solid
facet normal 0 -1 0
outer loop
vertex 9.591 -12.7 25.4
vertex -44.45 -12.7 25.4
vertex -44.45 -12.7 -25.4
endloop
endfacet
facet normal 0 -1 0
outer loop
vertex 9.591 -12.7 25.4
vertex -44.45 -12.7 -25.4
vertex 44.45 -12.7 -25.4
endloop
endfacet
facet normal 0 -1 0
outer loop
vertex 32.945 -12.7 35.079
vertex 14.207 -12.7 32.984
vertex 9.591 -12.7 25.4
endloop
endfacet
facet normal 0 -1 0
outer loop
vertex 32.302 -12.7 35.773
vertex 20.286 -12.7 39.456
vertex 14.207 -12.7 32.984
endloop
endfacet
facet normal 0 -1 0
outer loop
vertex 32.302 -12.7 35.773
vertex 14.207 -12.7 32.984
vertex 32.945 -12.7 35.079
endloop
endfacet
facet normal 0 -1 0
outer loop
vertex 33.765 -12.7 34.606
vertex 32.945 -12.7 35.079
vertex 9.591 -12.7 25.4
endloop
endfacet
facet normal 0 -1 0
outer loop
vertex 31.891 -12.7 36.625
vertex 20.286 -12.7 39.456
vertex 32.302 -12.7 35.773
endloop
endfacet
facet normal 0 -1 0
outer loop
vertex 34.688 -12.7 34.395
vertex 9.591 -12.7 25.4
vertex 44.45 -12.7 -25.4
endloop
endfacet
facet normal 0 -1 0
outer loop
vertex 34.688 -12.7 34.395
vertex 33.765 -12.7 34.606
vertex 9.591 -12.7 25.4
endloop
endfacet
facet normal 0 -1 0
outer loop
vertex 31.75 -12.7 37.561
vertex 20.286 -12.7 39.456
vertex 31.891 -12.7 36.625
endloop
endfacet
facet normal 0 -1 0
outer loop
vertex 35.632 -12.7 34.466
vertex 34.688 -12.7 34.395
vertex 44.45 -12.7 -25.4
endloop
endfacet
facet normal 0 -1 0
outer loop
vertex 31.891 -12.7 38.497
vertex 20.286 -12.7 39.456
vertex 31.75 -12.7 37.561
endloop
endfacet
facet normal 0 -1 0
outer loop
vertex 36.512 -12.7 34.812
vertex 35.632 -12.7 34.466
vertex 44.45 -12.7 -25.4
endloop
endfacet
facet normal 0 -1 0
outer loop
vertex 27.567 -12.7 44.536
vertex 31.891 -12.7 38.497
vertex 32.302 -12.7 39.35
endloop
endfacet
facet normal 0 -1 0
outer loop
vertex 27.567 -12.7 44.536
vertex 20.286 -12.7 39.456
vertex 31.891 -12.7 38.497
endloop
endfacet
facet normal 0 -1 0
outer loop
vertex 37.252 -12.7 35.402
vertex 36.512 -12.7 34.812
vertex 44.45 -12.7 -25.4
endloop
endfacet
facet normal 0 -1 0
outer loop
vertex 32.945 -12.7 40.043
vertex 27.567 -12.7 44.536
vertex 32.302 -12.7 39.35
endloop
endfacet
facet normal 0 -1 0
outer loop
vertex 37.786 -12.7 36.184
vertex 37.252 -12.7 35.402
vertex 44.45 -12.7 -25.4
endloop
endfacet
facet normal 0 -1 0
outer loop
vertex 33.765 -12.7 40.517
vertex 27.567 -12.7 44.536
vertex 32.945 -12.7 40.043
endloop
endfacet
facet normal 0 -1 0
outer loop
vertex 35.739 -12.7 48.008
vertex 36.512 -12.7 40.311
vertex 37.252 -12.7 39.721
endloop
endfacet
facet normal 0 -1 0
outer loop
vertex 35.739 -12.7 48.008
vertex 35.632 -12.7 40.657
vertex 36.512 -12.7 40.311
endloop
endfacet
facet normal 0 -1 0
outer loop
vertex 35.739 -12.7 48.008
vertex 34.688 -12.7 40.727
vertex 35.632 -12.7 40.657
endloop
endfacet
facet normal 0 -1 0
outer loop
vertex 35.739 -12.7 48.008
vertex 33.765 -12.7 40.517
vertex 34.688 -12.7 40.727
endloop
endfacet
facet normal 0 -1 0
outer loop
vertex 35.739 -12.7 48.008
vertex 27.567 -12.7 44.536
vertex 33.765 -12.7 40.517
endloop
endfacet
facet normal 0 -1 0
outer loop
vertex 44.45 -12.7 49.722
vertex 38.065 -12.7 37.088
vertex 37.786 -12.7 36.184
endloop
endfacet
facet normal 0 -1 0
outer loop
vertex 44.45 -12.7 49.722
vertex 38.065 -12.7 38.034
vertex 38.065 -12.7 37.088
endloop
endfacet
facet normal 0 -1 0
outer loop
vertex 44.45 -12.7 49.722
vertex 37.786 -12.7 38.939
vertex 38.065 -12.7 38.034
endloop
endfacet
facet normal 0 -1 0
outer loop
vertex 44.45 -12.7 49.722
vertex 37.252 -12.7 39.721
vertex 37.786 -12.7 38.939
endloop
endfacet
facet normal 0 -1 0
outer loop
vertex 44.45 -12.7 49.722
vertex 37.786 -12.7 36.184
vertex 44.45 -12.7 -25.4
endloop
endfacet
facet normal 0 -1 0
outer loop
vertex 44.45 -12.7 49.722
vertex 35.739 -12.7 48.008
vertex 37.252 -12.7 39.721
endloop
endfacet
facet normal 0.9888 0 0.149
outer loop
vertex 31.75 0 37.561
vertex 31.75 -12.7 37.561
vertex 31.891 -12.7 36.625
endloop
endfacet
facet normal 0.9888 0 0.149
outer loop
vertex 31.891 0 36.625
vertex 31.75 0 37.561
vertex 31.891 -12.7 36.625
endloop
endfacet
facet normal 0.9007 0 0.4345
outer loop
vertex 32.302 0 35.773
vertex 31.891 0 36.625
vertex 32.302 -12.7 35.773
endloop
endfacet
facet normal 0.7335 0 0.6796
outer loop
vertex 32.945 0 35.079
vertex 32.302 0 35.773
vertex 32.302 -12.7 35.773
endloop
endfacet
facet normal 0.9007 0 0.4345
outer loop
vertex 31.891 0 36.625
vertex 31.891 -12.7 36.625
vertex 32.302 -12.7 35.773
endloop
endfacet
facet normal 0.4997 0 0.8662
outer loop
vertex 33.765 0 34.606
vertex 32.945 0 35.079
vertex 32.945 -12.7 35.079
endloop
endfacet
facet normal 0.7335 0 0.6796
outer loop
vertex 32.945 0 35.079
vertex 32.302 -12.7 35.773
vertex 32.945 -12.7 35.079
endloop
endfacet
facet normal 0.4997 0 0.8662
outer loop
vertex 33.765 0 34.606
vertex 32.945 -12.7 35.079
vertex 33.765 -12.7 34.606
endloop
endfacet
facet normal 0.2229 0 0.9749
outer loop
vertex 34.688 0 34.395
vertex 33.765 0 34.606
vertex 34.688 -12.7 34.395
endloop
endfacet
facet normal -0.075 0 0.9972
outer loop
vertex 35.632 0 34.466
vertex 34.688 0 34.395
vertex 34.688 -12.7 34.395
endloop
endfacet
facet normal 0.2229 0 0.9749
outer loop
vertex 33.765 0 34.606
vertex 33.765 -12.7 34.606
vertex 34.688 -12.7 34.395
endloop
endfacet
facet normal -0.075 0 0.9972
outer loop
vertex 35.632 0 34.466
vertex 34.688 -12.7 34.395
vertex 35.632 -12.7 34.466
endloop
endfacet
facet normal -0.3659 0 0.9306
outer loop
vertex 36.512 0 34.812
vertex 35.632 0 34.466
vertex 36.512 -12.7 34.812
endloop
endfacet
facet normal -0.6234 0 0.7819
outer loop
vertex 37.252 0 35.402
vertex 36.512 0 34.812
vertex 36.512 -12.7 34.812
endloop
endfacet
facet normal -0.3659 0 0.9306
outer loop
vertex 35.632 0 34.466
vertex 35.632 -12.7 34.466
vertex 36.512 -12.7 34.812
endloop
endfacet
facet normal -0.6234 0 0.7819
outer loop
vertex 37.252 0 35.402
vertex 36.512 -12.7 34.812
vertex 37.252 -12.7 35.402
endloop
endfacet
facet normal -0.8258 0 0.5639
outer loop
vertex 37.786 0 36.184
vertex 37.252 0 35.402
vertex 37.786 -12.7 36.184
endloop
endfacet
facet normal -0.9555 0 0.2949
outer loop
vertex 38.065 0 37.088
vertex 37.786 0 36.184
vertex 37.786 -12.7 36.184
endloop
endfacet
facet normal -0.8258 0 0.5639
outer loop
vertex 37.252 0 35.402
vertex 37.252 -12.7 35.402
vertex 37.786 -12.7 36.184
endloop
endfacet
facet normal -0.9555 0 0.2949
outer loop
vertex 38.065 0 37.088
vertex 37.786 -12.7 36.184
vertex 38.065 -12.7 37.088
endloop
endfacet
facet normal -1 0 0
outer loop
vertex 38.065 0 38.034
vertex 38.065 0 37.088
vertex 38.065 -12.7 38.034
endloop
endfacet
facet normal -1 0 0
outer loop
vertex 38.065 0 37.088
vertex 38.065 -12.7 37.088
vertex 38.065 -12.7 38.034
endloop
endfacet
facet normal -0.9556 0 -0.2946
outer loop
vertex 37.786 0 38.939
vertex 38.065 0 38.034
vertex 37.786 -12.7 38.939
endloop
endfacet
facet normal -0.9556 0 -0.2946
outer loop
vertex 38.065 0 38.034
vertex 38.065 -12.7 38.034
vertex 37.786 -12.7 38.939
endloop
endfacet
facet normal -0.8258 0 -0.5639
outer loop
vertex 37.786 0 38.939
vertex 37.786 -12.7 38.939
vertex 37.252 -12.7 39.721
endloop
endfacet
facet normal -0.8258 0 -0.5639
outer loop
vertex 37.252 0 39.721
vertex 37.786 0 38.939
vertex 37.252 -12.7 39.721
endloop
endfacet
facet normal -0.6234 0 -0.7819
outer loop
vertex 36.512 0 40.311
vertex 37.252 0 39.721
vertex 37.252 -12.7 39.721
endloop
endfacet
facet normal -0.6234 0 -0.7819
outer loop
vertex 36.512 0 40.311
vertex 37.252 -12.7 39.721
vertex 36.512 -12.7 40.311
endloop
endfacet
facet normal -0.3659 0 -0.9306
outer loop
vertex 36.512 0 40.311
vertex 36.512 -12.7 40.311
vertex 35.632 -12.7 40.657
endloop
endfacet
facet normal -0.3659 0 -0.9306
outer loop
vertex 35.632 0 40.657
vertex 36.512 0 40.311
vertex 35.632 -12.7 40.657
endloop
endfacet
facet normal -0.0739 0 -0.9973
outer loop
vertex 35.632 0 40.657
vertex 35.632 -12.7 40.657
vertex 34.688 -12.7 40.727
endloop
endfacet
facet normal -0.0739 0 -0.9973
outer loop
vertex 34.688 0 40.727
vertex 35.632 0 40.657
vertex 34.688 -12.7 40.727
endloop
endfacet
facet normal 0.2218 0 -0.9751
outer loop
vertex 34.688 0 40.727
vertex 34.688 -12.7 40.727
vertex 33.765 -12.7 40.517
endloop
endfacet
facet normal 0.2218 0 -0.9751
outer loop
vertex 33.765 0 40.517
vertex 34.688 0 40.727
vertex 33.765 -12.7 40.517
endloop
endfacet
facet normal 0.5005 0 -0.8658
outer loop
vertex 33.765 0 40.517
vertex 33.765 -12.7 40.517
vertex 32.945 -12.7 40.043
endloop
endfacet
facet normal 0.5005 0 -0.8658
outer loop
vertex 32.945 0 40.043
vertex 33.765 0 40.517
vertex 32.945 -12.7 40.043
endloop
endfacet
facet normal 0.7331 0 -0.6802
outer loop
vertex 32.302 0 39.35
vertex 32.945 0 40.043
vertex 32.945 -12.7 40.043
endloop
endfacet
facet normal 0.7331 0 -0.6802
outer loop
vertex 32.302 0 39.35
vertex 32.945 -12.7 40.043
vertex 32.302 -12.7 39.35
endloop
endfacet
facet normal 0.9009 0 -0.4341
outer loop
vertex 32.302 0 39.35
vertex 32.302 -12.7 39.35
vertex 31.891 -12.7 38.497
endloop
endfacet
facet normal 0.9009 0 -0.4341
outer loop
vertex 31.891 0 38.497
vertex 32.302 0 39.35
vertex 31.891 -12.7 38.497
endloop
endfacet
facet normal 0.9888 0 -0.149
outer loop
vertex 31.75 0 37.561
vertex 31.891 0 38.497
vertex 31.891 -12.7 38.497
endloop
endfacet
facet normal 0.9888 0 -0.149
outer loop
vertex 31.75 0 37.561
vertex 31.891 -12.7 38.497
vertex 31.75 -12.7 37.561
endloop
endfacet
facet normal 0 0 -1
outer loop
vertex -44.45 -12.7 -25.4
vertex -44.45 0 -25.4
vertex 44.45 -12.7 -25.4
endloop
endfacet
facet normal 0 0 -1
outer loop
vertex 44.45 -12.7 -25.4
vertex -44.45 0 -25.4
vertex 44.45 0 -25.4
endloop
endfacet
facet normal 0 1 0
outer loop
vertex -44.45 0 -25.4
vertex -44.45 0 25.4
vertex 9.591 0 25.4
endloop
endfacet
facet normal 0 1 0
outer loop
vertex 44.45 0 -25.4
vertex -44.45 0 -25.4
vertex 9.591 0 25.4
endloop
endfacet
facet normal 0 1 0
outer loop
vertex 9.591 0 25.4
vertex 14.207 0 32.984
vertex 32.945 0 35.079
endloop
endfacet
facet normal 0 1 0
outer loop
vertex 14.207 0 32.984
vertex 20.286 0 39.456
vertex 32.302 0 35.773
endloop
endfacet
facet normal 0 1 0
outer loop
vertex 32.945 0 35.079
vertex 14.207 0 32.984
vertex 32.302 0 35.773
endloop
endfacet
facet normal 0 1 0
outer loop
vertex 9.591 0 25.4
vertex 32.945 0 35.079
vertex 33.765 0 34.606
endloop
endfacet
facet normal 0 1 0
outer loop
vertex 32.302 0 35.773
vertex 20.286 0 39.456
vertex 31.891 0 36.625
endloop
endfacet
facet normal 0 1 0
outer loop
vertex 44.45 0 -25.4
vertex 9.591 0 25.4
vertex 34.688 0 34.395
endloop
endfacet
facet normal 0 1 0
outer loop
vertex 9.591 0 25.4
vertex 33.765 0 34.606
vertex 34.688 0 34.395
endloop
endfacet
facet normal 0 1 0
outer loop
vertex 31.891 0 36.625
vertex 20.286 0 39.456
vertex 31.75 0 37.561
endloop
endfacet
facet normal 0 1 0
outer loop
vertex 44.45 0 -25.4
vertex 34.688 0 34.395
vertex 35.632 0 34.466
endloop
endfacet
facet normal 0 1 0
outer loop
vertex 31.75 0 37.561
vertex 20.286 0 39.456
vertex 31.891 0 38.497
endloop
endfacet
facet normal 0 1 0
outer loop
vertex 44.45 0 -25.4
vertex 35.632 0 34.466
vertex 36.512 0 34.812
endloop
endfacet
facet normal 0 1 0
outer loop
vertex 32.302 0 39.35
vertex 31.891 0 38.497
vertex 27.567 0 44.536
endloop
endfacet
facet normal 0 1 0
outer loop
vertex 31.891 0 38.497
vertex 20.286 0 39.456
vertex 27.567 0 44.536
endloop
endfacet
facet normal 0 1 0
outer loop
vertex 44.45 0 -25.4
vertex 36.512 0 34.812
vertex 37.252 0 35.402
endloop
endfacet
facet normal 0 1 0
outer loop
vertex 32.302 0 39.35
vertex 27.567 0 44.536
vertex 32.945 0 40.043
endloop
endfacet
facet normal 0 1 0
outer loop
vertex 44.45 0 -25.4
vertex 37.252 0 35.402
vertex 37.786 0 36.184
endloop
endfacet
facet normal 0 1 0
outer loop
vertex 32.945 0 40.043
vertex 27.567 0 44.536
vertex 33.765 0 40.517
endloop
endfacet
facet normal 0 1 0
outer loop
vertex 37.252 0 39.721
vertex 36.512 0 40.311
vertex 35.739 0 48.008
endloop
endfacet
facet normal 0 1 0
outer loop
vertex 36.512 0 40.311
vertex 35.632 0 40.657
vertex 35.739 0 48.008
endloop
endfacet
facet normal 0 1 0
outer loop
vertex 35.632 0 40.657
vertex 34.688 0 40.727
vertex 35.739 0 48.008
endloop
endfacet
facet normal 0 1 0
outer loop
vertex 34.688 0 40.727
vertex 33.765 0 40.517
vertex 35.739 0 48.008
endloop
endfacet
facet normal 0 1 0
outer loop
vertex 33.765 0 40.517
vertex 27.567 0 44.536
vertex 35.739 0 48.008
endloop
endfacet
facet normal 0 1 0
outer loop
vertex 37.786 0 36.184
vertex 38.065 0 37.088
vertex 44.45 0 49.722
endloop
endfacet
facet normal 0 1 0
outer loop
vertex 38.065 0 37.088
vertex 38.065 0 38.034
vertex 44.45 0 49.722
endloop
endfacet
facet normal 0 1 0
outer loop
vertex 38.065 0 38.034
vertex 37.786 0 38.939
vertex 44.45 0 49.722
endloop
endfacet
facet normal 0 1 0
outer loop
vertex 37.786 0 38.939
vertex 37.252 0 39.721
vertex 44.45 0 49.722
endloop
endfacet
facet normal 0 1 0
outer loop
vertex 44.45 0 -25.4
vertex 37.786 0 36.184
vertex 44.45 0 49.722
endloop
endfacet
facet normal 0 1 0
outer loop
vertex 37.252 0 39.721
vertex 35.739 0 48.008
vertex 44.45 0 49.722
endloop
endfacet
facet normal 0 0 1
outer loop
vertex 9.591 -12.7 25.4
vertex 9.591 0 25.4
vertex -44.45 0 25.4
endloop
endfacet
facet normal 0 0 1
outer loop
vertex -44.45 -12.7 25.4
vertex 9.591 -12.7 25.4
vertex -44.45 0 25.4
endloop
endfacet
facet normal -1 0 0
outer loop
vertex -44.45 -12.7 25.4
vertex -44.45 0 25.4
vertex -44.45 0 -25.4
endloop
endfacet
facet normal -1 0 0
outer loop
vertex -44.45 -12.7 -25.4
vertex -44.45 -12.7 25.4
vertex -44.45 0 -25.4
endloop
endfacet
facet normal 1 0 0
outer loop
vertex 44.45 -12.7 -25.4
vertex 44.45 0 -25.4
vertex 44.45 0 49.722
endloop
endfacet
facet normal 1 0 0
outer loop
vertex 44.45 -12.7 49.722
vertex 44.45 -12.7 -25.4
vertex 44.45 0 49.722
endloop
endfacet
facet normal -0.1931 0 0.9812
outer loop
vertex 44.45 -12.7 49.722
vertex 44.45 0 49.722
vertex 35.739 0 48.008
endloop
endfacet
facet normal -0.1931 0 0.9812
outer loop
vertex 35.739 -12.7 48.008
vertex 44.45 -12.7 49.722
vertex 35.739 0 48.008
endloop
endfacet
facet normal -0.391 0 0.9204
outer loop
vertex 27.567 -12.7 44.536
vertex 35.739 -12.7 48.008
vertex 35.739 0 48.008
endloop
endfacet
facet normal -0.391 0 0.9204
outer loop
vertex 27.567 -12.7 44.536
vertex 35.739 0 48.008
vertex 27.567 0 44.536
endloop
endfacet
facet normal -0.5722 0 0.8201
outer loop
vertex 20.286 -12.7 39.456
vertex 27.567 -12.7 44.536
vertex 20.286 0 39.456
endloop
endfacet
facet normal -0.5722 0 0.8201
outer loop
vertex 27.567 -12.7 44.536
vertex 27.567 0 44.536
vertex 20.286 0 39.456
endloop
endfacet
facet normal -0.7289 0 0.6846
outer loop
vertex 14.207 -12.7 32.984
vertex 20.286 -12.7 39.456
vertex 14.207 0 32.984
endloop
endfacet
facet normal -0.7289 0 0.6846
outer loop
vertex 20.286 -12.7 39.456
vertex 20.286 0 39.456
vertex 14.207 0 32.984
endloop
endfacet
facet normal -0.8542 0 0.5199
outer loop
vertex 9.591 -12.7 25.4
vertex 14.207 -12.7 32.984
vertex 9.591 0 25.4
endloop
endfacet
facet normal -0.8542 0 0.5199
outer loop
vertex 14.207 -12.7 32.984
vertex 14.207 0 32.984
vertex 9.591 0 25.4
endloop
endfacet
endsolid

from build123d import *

# Parameters (mm, degrees)
F1_DEPTH = 12.7
F3_D     = 6.35


with BuildPart() as f1:
    # F0 (on Front) → F1 (new body)
    with BuildSketch(Plane.XZ):
        Polygon((-44.45, 25.4), (-44.45, -25.4), (44.45, -25.4), (44.45, 25.4), (9.5911053941, 25.4), align=None)
        with BuildLine():
            Line((9.5911053941, 25.4), (44.45, 25.4))
            Line((44.45, 25.4), (44.45, 49.722302705))
            ThreePointArc((44.45, 49.722302705), (23.794397435, 42.1848996722), (9.5911053941, 25.4))
        make_face()
    extrude(amount=F1_DEPTH)

    # F3 (through all)
    with Locations(Plane(origin=(0, 0, 0), x_dir=(1, 0, 0), z_dir=(0, 1, 0))):
        with Locations((34.925, -37.5611312118)):
            Hole(F3_D / 2)


solid = f1.part
